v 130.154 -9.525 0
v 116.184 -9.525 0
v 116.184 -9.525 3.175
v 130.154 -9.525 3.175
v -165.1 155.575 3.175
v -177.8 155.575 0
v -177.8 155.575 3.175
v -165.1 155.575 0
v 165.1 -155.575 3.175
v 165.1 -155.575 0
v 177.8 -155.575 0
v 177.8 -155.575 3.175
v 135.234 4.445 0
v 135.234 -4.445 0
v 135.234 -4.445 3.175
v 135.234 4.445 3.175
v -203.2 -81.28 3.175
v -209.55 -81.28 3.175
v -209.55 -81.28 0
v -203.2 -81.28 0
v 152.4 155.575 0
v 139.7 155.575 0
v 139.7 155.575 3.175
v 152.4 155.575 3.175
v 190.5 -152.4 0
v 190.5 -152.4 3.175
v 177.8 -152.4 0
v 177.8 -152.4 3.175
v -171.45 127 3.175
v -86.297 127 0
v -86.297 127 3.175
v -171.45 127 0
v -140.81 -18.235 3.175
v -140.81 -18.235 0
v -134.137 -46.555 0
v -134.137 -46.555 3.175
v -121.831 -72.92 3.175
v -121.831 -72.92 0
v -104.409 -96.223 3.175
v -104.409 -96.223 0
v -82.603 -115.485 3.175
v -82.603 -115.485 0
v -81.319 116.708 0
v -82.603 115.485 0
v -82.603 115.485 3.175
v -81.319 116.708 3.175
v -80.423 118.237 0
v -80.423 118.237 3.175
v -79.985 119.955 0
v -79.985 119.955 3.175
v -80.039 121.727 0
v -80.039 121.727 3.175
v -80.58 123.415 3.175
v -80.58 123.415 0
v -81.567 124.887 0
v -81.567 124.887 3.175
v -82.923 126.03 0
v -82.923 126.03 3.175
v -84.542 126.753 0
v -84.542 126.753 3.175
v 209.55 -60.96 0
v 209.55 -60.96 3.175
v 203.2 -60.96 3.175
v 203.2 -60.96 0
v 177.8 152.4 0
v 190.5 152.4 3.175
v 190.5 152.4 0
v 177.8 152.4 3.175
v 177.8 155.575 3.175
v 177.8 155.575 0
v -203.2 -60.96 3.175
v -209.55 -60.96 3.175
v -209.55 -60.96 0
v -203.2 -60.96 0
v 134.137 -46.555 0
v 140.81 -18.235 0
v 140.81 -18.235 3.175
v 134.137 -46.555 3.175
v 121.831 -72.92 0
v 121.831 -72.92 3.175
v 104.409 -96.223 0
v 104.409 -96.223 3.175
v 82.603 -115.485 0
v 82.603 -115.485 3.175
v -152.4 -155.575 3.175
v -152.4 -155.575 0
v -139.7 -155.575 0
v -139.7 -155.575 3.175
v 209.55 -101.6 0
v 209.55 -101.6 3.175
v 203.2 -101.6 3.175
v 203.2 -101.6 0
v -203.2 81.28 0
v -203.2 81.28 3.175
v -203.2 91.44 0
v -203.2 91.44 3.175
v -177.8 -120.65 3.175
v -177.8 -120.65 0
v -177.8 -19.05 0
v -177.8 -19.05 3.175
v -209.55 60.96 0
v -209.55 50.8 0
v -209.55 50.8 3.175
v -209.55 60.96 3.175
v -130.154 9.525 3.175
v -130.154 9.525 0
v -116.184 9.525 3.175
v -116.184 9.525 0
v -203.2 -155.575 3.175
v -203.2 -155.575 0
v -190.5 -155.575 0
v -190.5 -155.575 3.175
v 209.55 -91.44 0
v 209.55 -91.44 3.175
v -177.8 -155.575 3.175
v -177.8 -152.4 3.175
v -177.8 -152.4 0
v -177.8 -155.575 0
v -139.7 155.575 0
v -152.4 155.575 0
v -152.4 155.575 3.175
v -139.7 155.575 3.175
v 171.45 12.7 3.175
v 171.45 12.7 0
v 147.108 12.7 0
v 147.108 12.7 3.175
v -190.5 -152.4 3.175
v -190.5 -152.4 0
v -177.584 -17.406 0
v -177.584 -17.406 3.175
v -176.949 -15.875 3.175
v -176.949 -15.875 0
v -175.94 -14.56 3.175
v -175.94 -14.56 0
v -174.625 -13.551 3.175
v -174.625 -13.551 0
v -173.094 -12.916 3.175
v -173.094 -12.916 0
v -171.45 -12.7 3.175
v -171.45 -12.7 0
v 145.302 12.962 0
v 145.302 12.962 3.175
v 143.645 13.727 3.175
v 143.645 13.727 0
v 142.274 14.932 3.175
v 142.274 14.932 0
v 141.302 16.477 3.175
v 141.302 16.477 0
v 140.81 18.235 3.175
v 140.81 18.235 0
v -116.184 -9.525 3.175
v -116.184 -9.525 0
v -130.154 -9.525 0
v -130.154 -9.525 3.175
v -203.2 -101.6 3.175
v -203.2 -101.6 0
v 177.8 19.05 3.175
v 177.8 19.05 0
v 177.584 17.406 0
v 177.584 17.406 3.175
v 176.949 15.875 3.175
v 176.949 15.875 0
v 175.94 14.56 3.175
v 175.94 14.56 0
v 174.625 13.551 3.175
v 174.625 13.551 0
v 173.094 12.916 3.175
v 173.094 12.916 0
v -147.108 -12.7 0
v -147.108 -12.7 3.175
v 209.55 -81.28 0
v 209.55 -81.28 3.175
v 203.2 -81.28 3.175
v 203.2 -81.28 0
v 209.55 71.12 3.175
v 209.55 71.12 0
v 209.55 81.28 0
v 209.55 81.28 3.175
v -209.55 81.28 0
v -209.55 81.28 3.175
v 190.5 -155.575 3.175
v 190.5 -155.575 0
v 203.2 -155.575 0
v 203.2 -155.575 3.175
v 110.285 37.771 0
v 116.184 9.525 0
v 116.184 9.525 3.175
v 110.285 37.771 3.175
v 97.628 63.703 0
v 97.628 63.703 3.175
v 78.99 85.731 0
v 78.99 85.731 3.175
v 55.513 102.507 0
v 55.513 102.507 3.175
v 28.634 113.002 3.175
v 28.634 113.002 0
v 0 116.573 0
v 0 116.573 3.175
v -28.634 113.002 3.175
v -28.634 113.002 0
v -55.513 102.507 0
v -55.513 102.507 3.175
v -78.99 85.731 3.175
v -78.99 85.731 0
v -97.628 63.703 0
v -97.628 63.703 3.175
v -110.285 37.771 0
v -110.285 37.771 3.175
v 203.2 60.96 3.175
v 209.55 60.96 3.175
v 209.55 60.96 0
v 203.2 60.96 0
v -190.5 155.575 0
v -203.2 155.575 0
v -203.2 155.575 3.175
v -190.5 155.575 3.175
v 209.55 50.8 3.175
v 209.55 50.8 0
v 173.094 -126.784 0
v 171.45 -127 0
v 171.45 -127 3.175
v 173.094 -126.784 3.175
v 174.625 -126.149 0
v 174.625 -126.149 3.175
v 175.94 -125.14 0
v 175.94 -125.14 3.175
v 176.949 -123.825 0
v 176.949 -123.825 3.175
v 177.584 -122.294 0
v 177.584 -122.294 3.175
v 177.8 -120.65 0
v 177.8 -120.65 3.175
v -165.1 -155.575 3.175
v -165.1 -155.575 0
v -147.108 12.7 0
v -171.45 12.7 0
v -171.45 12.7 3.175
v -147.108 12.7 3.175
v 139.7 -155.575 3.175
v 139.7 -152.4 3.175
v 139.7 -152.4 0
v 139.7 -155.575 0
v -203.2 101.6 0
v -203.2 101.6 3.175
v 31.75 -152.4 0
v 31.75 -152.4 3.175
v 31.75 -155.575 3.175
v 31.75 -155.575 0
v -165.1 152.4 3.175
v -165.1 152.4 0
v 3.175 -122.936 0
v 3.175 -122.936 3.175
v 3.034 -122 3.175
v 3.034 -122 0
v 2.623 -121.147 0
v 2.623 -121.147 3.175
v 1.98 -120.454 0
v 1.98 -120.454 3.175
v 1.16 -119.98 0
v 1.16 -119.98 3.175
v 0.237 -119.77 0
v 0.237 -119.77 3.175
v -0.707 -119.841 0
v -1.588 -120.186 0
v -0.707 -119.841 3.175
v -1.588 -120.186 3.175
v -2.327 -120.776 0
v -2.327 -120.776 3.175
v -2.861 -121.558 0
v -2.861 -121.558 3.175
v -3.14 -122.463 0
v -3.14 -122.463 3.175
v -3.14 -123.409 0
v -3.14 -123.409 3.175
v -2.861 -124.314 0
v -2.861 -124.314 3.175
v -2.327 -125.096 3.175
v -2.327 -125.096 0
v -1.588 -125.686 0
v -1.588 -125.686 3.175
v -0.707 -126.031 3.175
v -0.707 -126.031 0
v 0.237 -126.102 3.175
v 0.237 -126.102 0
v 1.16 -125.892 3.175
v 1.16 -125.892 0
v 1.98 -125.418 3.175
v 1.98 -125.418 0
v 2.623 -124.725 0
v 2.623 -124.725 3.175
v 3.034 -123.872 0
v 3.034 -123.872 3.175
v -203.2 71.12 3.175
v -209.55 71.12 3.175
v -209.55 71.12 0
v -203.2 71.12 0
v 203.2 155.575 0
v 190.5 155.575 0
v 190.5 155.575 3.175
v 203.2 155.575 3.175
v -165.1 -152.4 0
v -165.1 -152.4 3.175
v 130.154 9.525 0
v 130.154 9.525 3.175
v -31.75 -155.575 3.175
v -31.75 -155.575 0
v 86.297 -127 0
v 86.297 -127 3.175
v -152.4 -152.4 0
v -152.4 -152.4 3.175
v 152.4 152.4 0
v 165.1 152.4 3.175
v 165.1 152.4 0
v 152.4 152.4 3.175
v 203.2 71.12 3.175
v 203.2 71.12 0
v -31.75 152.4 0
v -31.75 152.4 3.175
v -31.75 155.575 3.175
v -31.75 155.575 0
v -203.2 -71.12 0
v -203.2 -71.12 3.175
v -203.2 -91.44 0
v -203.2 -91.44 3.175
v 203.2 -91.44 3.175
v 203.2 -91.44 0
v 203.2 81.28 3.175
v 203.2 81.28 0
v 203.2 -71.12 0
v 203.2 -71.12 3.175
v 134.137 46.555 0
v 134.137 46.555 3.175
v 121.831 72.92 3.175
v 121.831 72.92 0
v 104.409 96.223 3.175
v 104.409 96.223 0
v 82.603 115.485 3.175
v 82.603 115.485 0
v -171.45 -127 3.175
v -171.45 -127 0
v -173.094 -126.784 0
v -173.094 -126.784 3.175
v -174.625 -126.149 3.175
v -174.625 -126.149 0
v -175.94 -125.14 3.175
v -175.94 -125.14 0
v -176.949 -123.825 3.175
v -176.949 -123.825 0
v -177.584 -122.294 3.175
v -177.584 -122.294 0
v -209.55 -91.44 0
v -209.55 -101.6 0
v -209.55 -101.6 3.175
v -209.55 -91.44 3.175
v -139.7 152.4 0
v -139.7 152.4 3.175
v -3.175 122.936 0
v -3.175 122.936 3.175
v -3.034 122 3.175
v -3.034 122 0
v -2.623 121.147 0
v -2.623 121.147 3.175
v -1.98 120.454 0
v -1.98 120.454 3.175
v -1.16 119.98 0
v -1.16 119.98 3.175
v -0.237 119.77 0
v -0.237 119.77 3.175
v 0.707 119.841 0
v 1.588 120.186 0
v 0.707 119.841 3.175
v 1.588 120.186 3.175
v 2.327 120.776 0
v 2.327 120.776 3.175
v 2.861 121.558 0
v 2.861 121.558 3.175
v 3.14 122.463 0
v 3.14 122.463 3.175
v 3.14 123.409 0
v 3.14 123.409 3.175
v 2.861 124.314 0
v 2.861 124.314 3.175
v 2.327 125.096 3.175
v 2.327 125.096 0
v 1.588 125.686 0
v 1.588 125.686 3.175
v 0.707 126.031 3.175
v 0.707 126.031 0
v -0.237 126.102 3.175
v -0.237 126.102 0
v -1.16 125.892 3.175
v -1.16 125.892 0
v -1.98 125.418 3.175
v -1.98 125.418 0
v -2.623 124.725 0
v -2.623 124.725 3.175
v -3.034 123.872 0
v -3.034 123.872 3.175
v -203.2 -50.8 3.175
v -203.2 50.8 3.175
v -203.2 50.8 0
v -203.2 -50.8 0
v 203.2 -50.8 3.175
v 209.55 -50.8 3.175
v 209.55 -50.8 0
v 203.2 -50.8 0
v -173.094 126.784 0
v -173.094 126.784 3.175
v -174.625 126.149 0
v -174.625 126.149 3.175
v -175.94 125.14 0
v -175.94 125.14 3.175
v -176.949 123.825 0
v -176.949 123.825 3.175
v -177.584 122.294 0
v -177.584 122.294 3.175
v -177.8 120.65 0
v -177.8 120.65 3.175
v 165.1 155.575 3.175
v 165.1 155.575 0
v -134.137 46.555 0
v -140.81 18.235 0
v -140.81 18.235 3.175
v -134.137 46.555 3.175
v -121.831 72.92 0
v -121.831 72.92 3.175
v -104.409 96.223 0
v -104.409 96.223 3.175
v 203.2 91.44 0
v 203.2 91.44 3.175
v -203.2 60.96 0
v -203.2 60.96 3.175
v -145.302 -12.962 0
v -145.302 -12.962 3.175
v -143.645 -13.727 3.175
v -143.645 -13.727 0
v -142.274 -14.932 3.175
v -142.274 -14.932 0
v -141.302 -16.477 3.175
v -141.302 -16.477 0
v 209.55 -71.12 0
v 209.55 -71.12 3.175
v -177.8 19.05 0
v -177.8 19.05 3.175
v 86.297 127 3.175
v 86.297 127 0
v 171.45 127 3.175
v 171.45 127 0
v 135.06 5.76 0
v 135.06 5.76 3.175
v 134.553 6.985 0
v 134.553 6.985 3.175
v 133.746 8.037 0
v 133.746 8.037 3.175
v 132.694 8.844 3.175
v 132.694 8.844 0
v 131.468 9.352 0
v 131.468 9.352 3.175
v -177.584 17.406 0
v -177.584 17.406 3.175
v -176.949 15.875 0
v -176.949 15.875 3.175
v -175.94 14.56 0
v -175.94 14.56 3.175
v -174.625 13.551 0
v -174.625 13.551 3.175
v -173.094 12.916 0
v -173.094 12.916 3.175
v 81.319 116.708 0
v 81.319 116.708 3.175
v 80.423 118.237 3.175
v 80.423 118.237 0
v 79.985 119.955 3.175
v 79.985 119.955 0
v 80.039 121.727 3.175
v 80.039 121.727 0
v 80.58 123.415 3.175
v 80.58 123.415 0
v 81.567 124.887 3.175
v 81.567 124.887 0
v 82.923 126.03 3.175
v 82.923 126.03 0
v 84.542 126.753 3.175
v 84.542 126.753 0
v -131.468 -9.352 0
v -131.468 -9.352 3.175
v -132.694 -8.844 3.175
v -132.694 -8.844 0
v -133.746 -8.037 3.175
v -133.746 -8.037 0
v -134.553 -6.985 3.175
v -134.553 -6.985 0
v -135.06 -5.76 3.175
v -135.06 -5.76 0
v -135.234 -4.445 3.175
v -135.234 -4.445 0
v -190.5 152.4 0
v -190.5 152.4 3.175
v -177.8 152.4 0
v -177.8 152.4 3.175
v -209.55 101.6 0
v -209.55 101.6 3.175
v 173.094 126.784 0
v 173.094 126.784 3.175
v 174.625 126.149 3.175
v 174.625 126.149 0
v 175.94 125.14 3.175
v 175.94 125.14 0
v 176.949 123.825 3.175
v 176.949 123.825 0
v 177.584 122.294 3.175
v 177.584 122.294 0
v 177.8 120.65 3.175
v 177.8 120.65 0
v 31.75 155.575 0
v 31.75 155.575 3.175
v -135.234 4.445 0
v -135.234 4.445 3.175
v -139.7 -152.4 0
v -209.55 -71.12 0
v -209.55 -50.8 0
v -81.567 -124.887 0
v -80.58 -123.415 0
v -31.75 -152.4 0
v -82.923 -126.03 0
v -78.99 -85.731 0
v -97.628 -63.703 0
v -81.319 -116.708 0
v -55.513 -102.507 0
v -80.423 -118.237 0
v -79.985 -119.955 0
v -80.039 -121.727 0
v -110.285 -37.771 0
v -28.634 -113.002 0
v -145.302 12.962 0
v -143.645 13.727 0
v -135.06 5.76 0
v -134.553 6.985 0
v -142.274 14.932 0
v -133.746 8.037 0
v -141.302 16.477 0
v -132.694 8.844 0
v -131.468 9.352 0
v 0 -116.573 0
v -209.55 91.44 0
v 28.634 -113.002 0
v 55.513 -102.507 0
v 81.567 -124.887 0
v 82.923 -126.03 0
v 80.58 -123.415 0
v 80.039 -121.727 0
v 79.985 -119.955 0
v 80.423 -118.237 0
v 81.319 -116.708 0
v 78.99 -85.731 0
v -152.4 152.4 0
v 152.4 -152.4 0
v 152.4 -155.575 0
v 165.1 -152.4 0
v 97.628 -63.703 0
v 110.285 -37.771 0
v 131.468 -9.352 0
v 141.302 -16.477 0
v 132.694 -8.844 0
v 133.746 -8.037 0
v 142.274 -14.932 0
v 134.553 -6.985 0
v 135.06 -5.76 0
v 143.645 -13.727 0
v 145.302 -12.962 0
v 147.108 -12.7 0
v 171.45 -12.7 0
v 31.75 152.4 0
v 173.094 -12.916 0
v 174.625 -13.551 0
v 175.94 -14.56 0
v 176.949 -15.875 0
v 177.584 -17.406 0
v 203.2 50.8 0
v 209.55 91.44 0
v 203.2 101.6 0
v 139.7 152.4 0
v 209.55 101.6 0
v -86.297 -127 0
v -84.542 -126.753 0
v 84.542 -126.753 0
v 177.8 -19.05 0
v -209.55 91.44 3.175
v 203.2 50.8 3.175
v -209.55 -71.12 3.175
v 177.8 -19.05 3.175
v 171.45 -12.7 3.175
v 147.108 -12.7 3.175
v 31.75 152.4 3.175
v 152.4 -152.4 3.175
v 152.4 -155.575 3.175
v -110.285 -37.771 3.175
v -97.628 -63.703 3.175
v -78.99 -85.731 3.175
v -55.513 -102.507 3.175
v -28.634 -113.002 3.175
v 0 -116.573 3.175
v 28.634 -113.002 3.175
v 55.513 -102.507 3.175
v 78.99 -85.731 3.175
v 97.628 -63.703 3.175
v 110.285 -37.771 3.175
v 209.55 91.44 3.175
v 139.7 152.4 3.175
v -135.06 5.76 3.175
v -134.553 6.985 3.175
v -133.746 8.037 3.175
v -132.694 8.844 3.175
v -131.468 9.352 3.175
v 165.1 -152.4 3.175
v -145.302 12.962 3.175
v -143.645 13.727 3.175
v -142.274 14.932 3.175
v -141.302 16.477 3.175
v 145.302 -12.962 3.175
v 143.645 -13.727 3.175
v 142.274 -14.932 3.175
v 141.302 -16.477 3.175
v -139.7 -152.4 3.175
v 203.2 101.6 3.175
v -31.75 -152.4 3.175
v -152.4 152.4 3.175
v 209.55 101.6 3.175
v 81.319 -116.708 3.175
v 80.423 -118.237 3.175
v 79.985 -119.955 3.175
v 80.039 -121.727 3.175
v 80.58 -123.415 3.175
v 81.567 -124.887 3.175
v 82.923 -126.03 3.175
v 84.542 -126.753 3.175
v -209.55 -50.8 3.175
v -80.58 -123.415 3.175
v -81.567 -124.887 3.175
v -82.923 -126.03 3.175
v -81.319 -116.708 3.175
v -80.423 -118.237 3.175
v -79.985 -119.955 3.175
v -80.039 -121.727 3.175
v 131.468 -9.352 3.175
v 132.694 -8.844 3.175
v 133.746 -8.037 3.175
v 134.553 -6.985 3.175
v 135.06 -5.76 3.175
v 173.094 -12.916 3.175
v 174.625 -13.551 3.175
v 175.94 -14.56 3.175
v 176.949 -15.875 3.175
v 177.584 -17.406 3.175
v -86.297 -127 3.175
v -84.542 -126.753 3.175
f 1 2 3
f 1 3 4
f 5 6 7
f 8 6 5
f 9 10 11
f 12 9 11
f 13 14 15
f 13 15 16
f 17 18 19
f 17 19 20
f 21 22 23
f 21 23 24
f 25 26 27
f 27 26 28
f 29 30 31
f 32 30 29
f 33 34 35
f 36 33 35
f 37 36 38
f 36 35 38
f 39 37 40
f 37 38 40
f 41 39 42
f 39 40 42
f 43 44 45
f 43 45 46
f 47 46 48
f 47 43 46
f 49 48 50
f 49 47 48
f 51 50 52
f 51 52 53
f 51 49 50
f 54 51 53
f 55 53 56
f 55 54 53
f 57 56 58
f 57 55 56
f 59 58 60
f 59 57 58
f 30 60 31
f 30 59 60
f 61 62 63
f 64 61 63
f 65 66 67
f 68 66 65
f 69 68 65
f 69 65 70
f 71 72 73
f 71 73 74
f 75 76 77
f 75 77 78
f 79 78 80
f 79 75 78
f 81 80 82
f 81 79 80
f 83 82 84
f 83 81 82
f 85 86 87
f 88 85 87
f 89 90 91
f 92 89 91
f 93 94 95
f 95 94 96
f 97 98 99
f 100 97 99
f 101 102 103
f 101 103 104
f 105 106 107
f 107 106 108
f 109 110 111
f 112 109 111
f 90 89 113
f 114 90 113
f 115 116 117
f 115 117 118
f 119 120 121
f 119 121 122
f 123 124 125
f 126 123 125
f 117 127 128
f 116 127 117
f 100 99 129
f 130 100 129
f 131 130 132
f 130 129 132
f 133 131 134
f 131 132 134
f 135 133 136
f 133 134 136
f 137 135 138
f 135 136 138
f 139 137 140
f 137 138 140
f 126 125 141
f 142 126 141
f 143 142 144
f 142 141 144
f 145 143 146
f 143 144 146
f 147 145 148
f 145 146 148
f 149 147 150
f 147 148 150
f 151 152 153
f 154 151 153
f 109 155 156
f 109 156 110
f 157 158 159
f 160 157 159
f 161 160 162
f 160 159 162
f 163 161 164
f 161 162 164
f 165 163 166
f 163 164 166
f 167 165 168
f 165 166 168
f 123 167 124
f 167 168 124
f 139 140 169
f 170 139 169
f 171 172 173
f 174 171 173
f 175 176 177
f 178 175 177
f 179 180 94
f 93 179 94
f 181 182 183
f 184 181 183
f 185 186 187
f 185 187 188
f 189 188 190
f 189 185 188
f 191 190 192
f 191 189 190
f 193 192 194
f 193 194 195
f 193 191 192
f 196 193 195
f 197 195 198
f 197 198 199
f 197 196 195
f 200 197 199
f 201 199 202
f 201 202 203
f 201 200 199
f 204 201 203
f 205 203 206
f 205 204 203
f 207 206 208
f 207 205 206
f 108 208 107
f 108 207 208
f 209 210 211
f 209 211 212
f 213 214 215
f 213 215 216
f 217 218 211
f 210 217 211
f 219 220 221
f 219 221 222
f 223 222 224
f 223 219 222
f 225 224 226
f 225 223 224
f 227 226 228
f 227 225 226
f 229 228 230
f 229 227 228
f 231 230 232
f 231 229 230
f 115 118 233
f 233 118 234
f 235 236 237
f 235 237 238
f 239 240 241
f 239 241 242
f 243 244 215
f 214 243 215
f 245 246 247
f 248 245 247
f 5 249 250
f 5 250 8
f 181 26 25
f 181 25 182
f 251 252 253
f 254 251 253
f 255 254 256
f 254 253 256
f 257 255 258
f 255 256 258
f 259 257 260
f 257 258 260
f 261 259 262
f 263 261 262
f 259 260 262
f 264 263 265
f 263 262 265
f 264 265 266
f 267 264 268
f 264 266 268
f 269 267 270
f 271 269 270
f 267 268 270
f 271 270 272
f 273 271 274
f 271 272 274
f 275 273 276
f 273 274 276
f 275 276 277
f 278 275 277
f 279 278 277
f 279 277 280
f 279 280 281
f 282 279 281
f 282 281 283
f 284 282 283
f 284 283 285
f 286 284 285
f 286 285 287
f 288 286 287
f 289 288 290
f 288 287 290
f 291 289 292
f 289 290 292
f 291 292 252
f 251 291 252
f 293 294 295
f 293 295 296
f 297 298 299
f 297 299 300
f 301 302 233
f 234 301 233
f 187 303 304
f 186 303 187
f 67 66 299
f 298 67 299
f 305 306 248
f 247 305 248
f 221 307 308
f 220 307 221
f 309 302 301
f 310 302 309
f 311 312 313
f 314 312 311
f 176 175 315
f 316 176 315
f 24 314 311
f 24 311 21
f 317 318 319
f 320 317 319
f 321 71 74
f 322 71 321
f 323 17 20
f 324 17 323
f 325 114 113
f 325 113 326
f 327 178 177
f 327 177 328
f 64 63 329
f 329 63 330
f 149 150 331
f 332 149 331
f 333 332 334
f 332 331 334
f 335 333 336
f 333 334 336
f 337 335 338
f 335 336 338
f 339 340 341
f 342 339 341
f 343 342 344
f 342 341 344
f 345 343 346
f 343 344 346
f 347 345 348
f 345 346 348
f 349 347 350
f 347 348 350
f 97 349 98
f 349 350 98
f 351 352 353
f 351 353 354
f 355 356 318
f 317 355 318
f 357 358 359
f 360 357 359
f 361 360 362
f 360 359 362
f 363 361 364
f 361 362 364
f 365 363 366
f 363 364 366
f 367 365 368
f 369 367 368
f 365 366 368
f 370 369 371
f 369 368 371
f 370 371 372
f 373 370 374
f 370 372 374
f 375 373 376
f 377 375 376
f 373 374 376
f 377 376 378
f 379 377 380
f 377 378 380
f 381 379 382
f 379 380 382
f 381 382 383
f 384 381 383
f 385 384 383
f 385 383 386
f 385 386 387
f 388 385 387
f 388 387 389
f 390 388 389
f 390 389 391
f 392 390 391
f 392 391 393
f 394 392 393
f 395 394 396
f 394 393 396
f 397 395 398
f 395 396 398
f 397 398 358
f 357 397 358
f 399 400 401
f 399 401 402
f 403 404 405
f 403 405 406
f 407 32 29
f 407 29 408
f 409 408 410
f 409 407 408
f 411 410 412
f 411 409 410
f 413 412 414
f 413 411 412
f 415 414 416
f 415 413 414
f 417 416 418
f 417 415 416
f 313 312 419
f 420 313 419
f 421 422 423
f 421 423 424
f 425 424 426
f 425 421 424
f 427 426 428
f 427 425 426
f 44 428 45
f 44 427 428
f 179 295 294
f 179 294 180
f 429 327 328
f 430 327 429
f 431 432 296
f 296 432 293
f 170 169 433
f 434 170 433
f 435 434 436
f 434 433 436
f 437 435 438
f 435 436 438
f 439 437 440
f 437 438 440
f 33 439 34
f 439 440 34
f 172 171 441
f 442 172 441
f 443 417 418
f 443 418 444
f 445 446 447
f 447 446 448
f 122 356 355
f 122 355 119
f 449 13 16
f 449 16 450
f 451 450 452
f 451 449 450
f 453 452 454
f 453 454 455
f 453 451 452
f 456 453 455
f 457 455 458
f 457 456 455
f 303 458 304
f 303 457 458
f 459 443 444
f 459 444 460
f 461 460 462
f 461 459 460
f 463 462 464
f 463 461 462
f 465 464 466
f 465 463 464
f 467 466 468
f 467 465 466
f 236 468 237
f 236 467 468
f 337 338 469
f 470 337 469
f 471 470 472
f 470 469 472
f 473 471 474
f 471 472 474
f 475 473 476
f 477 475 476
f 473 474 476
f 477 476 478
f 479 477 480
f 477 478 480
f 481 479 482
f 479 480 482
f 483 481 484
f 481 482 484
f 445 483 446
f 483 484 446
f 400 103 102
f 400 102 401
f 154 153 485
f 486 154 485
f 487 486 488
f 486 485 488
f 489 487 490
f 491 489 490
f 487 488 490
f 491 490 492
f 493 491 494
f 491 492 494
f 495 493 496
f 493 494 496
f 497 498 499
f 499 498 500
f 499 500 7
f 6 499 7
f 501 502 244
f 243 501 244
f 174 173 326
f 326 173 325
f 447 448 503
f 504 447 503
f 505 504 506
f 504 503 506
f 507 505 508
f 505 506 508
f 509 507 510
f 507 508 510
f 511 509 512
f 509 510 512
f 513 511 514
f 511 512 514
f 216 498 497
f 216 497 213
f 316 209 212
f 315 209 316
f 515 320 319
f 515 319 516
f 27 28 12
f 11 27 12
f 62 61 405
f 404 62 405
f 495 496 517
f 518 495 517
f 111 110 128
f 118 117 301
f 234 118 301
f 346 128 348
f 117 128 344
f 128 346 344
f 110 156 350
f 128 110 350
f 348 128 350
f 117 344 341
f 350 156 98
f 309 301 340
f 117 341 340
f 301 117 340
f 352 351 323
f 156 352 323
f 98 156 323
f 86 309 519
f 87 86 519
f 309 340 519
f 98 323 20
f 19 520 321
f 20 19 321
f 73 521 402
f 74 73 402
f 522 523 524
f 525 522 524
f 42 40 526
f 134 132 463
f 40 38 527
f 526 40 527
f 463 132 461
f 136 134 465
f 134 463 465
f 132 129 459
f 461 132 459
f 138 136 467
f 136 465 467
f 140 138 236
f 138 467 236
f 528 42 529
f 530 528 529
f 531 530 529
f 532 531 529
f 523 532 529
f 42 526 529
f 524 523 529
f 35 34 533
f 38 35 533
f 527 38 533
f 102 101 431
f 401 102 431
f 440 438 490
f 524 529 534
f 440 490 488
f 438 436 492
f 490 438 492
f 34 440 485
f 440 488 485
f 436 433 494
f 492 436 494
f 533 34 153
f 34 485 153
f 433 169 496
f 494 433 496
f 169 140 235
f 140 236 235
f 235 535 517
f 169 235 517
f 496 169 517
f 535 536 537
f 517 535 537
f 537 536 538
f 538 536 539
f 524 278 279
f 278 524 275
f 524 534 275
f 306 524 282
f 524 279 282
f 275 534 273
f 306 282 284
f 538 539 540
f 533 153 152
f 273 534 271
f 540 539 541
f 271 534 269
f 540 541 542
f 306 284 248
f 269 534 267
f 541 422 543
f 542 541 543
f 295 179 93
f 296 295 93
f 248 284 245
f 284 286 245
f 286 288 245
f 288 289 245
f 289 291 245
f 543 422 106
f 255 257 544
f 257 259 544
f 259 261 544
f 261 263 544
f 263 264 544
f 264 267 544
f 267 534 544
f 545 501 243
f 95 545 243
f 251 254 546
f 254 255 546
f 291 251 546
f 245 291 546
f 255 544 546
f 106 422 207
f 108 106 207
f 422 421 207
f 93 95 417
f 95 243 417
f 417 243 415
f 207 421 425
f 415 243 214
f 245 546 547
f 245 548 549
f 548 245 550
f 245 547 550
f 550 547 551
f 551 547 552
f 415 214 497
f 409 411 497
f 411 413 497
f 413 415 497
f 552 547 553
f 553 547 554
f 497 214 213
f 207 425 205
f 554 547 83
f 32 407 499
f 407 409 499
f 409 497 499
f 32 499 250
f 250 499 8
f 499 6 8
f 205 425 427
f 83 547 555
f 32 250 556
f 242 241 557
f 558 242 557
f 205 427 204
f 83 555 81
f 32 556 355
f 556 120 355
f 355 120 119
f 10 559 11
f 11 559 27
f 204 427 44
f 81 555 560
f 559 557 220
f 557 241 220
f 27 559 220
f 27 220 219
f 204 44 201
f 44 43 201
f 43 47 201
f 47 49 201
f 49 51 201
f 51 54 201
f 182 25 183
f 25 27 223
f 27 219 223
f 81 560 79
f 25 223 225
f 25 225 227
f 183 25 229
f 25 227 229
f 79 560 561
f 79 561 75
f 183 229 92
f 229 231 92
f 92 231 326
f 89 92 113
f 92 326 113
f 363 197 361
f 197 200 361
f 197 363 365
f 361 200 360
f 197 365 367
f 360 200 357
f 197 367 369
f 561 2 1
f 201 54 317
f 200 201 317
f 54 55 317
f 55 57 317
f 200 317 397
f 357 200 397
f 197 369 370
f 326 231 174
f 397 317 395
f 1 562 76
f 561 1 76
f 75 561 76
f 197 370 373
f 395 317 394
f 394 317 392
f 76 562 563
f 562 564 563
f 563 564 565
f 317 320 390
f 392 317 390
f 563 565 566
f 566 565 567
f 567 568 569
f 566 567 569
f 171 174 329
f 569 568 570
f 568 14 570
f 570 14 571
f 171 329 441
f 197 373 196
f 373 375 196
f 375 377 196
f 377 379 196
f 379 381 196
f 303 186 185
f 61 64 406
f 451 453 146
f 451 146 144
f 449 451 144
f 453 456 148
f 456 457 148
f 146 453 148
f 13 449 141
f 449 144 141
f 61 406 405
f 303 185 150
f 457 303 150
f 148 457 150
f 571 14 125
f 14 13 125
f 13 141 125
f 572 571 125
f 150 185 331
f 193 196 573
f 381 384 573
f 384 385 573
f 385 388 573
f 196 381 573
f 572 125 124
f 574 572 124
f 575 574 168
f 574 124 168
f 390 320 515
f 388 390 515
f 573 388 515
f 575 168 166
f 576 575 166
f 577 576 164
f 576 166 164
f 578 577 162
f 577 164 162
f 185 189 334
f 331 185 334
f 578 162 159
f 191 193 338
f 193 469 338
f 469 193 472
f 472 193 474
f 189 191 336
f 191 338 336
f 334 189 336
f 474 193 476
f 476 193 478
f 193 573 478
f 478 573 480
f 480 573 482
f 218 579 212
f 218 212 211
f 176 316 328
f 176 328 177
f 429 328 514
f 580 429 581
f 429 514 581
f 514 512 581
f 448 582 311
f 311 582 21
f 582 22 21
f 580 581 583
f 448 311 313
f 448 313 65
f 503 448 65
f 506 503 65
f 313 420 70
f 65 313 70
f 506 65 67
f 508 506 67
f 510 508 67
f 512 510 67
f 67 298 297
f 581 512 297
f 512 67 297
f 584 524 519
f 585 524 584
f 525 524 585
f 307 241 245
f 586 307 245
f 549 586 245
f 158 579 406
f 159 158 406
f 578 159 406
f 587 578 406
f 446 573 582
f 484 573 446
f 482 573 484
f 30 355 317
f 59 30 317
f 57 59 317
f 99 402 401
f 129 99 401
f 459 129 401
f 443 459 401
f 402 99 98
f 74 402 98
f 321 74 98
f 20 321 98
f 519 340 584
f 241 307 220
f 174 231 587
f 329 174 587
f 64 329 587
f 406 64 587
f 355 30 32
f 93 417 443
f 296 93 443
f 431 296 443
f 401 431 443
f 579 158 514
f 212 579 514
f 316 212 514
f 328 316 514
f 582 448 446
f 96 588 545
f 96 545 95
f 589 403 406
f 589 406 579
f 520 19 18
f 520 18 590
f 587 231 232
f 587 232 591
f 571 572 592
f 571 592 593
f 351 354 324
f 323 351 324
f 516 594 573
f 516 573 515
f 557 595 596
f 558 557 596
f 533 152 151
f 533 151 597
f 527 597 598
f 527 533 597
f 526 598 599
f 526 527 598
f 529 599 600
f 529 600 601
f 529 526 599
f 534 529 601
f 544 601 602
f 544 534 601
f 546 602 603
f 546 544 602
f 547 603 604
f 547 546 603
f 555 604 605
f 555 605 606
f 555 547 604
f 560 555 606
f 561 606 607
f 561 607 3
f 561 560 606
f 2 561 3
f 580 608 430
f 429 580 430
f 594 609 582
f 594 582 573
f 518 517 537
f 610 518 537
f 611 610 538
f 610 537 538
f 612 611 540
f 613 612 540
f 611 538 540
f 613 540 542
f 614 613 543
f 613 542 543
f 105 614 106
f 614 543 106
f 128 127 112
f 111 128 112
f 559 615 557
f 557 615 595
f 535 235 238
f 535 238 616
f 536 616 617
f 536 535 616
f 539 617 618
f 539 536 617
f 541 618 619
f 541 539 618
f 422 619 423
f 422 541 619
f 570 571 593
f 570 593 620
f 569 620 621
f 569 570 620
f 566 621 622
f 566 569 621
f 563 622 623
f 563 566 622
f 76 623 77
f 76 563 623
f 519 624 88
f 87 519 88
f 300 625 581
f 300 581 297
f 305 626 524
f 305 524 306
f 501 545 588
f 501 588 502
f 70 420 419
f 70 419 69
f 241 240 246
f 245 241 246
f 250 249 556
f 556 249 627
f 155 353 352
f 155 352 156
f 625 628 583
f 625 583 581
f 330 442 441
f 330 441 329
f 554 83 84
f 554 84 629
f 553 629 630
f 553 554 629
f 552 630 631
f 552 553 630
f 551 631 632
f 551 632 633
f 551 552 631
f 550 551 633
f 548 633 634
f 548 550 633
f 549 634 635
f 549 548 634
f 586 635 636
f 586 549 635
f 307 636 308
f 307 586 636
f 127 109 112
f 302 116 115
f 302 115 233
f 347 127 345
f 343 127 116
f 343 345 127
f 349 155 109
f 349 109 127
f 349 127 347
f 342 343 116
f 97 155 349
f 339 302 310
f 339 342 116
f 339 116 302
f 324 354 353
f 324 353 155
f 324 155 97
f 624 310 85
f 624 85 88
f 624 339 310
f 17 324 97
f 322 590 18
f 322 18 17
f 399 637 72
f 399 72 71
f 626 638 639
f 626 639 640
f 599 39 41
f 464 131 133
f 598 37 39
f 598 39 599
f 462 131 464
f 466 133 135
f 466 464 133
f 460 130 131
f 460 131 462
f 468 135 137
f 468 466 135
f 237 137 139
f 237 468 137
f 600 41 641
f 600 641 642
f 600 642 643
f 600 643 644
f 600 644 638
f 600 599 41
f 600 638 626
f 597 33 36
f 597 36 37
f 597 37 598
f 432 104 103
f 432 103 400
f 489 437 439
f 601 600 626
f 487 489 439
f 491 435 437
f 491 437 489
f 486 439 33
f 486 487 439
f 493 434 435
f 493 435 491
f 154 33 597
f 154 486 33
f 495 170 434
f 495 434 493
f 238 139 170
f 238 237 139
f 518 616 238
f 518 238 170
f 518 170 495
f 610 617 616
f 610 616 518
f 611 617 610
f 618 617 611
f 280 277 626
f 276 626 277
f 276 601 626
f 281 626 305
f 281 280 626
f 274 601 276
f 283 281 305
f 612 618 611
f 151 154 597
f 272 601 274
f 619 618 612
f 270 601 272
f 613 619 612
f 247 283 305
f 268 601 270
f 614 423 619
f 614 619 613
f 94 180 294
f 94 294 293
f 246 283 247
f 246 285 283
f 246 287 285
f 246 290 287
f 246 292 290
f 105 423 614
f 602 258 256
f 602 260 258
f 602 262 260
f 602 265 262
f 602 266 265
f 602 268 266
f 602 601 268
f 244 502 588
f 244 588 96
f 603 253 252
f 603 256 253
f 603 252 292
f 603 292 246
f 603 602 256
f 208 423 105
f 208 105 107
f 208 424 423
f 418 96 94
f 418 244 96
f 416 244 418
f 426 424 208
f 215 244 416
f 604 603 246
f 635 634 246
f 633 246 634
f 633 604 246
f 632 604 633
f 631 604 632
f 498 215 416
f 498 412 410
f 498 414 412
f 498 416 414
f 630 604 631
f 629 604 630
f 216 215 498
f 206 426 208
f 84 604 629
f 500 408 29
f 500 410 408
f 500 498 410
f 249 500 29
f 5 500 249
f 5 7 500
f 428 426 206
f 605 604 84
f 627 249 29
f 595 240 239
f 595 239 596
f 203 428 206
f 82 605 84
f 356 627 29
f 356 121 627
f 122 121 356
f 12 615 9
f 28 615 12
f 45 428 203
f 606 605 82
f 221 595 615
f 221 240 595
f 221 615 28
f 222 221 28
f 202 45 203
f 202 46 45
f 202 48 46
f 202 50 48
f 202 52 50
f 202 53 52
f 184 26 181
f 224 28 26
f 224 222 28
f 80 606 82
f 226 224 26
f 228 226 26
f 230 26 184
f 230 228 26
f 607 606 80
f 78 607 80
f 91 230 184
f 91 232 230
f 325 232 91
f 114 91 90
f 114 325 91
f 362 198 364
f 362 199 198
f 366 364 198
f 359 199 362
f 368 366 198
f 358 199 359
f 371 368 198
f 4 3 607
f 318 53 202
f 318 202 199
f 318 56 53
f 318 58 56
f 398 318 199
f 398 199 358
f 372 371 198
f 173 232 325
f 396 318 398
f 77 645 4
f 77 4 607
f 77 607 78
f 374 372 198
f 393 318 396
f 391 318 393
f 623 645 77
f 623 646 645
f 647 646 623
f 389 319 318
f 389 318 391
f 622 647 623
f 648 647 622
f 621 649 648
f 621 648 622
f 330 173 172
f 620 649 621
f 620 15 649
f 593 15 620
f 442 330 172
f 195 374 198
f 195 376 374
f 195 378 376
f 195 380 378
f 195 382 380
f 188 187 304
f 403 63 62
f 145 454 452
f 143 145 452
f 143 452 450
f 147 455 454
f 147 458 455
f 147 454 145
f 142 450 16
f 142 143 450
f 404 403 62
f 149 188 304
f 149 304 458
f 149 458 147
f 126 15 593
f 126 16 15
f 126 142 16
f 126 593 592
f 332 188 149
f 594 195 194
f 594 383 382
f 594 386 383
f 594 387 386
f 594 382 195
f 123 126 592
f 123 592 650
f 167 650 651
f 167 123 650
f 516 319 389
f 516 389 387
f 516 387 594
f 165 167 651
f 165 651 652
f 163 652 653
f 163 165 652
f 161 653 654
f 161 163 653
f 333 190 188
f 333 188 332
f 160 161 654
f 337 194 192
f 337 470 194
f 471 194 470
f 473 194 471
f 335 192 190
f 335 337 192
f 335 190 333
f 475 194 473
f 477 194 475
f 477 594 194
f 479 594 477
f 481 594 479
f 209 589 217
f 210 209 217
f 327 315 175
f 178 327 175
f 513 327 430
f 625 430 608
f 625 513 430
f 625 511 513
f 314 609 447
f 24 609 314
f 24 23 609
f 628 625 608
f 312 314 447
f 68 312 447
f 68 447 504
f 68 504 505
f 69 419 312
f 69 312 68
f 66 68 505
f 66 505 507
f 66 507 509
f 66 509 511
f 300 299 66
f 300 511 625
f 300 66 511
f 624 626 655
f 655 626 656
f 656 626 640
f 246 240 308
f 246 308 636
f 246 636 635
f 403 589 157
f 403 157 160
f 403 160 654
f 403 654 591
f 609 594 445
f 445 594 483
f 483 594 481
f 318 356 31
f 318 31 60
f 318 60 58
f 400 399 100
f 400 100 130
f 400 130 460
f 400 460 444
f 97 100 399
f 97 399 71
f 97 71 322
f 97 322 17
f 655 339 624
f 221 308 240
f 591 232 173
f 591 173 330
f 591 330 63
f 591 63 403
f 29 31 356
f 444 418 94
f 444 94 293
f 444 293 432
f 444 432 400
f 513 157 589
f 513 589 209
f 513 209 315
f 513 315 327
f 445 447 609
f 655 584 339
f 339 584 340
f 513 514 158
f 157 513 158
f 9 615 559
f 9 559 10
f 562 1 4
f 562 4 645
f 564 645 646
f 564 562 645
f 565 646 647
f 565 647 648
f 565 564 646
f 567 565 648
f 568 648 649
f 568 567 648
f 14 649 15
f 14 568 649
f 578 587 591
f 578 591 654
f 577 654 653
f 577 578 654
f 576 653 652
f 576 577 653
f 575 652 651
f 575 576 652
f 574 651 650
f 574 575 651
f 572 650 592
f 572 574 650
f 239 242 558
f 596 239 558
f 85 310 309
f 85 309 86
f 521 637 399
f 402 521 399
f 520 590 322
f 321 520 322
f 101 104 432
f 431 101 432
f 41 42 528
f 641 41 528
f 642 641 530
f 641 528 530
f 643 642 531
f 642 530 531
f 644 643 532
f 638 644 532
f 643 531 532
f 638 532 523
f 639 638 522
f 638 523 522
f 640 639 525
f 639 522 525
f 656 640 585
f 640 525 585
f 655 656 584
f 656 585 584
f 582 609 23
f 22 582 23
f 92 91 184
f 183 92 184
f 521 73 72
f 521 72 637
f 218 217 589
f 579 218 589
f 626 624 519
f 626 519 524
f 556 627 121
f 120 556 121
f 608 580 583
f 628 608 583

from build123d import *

# Parameters (mm, degrees)
SKETCH1_W                 = 419.1
SKETCH1_H                 = 311.15
SKETCH1_R                 = 116.5733
BOSS_EXTRUDE1_DEPTH       = 3.175
SKETCH2_R                 = 3.175
CUT_EXTRUDE1_DEPTH        = 3.175
CUT_EXTRUDE2_START        = -3.175
CUT_EXTRUDE2_DEPTH        = 3.175
SKETCH4_W                 = 107.95
SKETCH4_H                 = 3.175
SKETCH4_W_2               = 12.7
CUT_EXTRUDE3_DEPTH        = 3.175
MIRROR3_COPY_1_SKETCH_W   = 107.95
MIRROR3_COPY_1_SKETCH_H   = 3.175
MIRROR3_COPY_1_SKETCH_W_2 = 12.7
MIRROR3_COPY_1_DEPTH      = 3.175
SKETCH6_W                 = 6.35
SKETCH6_H                 = 50.8
SKETCH6_H_2               = 10.16
CUT_EXTRUDE4_DEPTH        = 3.175
MIRROR5_COPY_1_SKETCH_W   = 6.35
MIRROR5_COPY_1_SKETCH_H   = 50.8
MIRROR5_COPY_1_SKETCH_H_2 = 10.16
MIRROR5_COPY_1_DEPTH      = 3.175


with BuildPart() as part:
    # Sketch1 → Boss-Extrude1 (new body)
    with BuildSketch(Plane.XY):
        Rectangle(SKETCH1_W, SKETCH1_H)
        Circle(SKETCH1_R, mode=Mode.SUBTRACT)
        with BuildLine():
            Line((-86.296850441, 127), (-171.45, 127))
            ThreePointArc((-171.45, 127), (-175.940128061, 125.140128061), (-177.8, 120.65))
            Line((-177.8, 120.65), (-177.8, 19.05))
            ThreePointArc((-177.8, 19.05), (-175.940128061, 14.559871939), (-171.45, 12.7))
            Line((-171.45, 12.7), (-147.107669399, 12.7))
            ThreePointArc((-147.107669399, 12.7), (-142.915766684, 14.28025665), (-140.810252045, 18.234503425))
            ThreePointArc((-140.810252045, 18.234503425), (-121.830839941, 72.91961763), (-82.602635953, 115.485188356))
            ThreePointArc((-82.602635953, 115.485188356), (-80.250402974, 122.589838403), (-86.296850441, 127))
        make_face(mode=Mode.SUBTRACT)
        with BuildLine():
            Line((-177.8, -120.65), (-177.8, -19.05))
            ThreePointArc((-177.8, -19.05), (-175.940128061, -14.559871939), (-171.45, -12.7))
            Line((-171.45, -12.7), (-147.107669399, -12.7))
            ThreePointArc((-147.107669399, -12.7), (-142.915766684, -14.28025665), (-140.810252045, -18.234503425))
            ThreePointArc((-140.810252045, -18.234503425), (-121.830839941, -72.91961763), (-82.602635953, -115.485188356))
            ThreePointArc((-82.602635953, -115.485188356), (-80.250402974, -122.589838403), (-86.296850441, -127))
            Line((-86.296850441, -127), (-171.45, -127))
            ThreePointArc((-171.45, -127), (-175.940128061, -125.140128061), (-177.8, -120.65))
        make_face(mode=Mode.SUBTRACT)
        with BuildLine():
            Line((86.296850441, -127), (171.45, -127))
            ThreePointArc((171.45, -127), (175.940128061, -125.140128061), (177.8, -120.65))
            Line((177.8, -120.65), (177.8, -19.05))
            ThreePointArc((177.8, -19.05), (175.940128061, -14.559871939), (171.45, -12.7))
            Line((171.45, -12.7), (147.107669399, -12.7))
            ThreePointArc((147.107669399, -12.7), (142.915766684, -14.28025665), (140.810252045, -18.234503425))
            ThreePointArc((140.810252045, -18.234503425), (121.830839941, -72.91961763), (82.602635953, -115.485188356))
            ThreePointArc((82.602635953, -115.485188356), (80.250402974, -122.589838403), (86.296850441, -127))
        make_face(mode=Mode.SUBTRACT)
        with BuildLine():
            Line((177.8, 120.65), (177.8, 19.05))
            ThreePointArc((177.8, 19.05), (175.940128061, 14.559871939), (171.45, 12.7))
            Line((171.45, 12.7), (147.107669399, 12.7))
            ThreePointArc((147.107669399, 12.7), (142.915766684, 14.28025665), (140.810252045, 18.234503425))
            ThreePointArc((140.810252045, 18.234503425), (121.830839941, 72.91961763), (82.602635953, 115.485188356))
            ThreePointArc((82.602635953, 115.485188356), (80.250402974, 122.589838403), (86.296850441, 127))
            Line((86.296850441, 127), (171.45, 127))
            ThreePointArc((171.45, 127), (175.940128061, 125.140128061), (177.8, 120.65))
        make_face(mode=Mode.SUBTRACT)
    extrude(amount=BOSS_EXTRUDE1_DEPTH)

    # Sketch2 → Cut-Extrude1 (cut)
    with BuildSketch(Plane.XY.offset(3.175)):
        with Locations(Location((0, 122.936, 0), (0, 0, 180))):
            Circle(SKETCH2_R)
        with Locations((0, -122.936)):
            Circle(SKETCH2_R)
    extrude(amount=-CUT_EXTRUDE1_DEPTH, mode=Mode.SUBTRACT)

    # Sketch3 → Cut-Extrude2 (cut)
    with BuildSketch(Plane.XY.offset(3.175).offset(CUT_EXTRUDE2_START)):
        with BuildLine():
            Line((116.183512806, -9.525), (130.153512806, -9.525))
            ThreePointArc((130.153512806, -9.525), (133.745615254, -8.037102448), (135.233512806, -4.445))
            Line((135.233512806, -4.445), (135.233512806, 4.445))
            ThreePointArc((135.233512806, 4.445), (133.745615254, 8.037102448), (130.153512806, 9.525))
            Line((130.153512806, 9.525), (116.183512806, 9.525))
            ThreePointArc((116.183512806, 9.525), (116.5733, 0), (116.183512806, -9.525))
        make_face()
    cut_extrude2 = extrude(amount=CUT_EXTRUDE2_DEPTH, mode=Mode.SUBTRACT)

    # Mirror6: Cut-Extrude2 across plane
    add(cut_extrude2.mirror(Plane(origin=(0, 0, 0), x_dir=(0, 0, 1), z_dir=(1, 0, 0))), mode=Mode.SUBTRACT)

    # Sketch4 → Cut-Extrude3 (cut)
    with BuildSketch(Plane.XY.offset(3.175)):
        with Locations((-85.725, 153.9875)):
            Rectangle(SKETCH4_W, SKETCH4_H)
        with Locations((-184.15, 153.9875)):
            Rectangle(SKETCH4_W_2, SKETCH4_H)
        with Locations((-209.55, 153.9875)):
            Rectangle(SKETCH4_W_2, SKETCH4_H)
        with Locations((-158.75, 153.9875)):
            Rectangle(SKETCH4_W_2, SKETCH4_H)
    cut_extrude3 = extrude(amount=-CUT_EXTRUDE3_DEPTH, mode=Mode.SUBTRACT)

    # Mirror2: Cut-Extrude3 across plane
    add(cut_extrude3.mirror(Plane(origin=(0, 0, 0), x_dir=(0, 0, 1), z_dir=(1, 0, 0))), mode=Mode.SUBTRACT)

    # Mirror3: Cut-Extrude3 across plane
    add(cut_extrude3.mirror(Plane.ZX), mode=Mode.SUBTRACT)

    # Mirror3 copy 1 sketch → Mirror3 copy 1 (cut)
    with BuildSketch(Plane(origin=(0, 0, 3.175), x_dir=(-1, 0, 0), z_dir=(0, 0, 1))):
        with Locations((-85.725, 153.9875)):
            Rectangle(MIRROR3_COPY_1_SKETCH_W, MIRROR3_COPY_1_SKETCH_H)
        with Locations((-184.15, 153.9875)):
            Rectangle(MIRROR3_COPY_1_SKETCH_W_2, MIRROR3_COPY_1_SKETCH_H)
        with Locations((-209.55, 153.9875)):
            Rectangle(MIRROR3_COPY_1_SKETCH_W_2, MIRROR3_COPY_1_SKETCH_H)
        with Locations((-158.75, 153.9875)):
            Rectangle(MIRROR3_COPY_1_SKETCH_W_2, MIRROR3_COPY_1_SKETCH_H)
    extrude(amount=-MIRROR3_COPY_1_DEPTH, mode=Mode.SUBTRACT)

    # Sketch6 → Cut-Extrude4 (cut)
    with BuildSketch(Plane.XY.offset(3.175)):
        with Locations((-206.375, 127)):
            Rectangle(SKETCH6_W, SKETCH6_H)
        with Locations((-206.375, 25.4)):
            Rectangle(SKETCH6_W, SKETCH6_H)
        with Locations((-206.375, 86.36)):
            Rectangle(SKETCH6_W, SKETCH6_H_2)
        with Locations((-206.375, 66.04)):
            Rectangle(SKETCH6_W, SKETCH6_H_2)
    cut_extrude4 = extrude(amount=-CUT_EXTRUDE4_DEPTH, mode=Mode.SUBTRACT)

    # Mirror4: Cut-Extrude4 across plane
    add(cut_extrude4.mirror(Plane(origin=(0, 0, 0), x_dir=(0, 0, 1), z_dir=(1, 0, 0))), mode=Mode.SUBTRACT)

    # Mirror5: Cut-Extrude4 across plane
    add(cut_extrude4.mirror(Plane.ZX), mode=Mode.SUBTRACT)

    # Mirror5 copy 1 sketch → Mirror5 copy 1 (cut)
    with BuildSketch(Plane(origin=(0, 0, 3.175), x_dir=(-1, 0, 0), z_dir=(0, 0, 1))):
        with Locations((-206.375, 127)):
            Rectangle(MIRROR5_COPY_1_SKETCH_W, MIRROR5_COPY_1_SKETCH_H)
        with Locations((-206.375, 25.4)):
            Rectangle(MIRROR5_COPY_1_SKETCH_W, MIRROR5_COPY_1_SKETCH_H)
        with Locations((-206.375, 86.36)):
            Rectangle(MIRROR5_COPY_1_SKETCH_W, MIRROR5_COPY_1_SKETCH_H_2)
        with Locations((-206.375, 66.04)):
            Rectangle(MIRROR5_COPY_1_SKETCH_W, MIRROR5_COPY_1_SKETCH_H_2)
    extrude(amount=-MIRROR5_COPY_1_DEPTH, mode=Mode.SUBTRACT)


solid = part.part
